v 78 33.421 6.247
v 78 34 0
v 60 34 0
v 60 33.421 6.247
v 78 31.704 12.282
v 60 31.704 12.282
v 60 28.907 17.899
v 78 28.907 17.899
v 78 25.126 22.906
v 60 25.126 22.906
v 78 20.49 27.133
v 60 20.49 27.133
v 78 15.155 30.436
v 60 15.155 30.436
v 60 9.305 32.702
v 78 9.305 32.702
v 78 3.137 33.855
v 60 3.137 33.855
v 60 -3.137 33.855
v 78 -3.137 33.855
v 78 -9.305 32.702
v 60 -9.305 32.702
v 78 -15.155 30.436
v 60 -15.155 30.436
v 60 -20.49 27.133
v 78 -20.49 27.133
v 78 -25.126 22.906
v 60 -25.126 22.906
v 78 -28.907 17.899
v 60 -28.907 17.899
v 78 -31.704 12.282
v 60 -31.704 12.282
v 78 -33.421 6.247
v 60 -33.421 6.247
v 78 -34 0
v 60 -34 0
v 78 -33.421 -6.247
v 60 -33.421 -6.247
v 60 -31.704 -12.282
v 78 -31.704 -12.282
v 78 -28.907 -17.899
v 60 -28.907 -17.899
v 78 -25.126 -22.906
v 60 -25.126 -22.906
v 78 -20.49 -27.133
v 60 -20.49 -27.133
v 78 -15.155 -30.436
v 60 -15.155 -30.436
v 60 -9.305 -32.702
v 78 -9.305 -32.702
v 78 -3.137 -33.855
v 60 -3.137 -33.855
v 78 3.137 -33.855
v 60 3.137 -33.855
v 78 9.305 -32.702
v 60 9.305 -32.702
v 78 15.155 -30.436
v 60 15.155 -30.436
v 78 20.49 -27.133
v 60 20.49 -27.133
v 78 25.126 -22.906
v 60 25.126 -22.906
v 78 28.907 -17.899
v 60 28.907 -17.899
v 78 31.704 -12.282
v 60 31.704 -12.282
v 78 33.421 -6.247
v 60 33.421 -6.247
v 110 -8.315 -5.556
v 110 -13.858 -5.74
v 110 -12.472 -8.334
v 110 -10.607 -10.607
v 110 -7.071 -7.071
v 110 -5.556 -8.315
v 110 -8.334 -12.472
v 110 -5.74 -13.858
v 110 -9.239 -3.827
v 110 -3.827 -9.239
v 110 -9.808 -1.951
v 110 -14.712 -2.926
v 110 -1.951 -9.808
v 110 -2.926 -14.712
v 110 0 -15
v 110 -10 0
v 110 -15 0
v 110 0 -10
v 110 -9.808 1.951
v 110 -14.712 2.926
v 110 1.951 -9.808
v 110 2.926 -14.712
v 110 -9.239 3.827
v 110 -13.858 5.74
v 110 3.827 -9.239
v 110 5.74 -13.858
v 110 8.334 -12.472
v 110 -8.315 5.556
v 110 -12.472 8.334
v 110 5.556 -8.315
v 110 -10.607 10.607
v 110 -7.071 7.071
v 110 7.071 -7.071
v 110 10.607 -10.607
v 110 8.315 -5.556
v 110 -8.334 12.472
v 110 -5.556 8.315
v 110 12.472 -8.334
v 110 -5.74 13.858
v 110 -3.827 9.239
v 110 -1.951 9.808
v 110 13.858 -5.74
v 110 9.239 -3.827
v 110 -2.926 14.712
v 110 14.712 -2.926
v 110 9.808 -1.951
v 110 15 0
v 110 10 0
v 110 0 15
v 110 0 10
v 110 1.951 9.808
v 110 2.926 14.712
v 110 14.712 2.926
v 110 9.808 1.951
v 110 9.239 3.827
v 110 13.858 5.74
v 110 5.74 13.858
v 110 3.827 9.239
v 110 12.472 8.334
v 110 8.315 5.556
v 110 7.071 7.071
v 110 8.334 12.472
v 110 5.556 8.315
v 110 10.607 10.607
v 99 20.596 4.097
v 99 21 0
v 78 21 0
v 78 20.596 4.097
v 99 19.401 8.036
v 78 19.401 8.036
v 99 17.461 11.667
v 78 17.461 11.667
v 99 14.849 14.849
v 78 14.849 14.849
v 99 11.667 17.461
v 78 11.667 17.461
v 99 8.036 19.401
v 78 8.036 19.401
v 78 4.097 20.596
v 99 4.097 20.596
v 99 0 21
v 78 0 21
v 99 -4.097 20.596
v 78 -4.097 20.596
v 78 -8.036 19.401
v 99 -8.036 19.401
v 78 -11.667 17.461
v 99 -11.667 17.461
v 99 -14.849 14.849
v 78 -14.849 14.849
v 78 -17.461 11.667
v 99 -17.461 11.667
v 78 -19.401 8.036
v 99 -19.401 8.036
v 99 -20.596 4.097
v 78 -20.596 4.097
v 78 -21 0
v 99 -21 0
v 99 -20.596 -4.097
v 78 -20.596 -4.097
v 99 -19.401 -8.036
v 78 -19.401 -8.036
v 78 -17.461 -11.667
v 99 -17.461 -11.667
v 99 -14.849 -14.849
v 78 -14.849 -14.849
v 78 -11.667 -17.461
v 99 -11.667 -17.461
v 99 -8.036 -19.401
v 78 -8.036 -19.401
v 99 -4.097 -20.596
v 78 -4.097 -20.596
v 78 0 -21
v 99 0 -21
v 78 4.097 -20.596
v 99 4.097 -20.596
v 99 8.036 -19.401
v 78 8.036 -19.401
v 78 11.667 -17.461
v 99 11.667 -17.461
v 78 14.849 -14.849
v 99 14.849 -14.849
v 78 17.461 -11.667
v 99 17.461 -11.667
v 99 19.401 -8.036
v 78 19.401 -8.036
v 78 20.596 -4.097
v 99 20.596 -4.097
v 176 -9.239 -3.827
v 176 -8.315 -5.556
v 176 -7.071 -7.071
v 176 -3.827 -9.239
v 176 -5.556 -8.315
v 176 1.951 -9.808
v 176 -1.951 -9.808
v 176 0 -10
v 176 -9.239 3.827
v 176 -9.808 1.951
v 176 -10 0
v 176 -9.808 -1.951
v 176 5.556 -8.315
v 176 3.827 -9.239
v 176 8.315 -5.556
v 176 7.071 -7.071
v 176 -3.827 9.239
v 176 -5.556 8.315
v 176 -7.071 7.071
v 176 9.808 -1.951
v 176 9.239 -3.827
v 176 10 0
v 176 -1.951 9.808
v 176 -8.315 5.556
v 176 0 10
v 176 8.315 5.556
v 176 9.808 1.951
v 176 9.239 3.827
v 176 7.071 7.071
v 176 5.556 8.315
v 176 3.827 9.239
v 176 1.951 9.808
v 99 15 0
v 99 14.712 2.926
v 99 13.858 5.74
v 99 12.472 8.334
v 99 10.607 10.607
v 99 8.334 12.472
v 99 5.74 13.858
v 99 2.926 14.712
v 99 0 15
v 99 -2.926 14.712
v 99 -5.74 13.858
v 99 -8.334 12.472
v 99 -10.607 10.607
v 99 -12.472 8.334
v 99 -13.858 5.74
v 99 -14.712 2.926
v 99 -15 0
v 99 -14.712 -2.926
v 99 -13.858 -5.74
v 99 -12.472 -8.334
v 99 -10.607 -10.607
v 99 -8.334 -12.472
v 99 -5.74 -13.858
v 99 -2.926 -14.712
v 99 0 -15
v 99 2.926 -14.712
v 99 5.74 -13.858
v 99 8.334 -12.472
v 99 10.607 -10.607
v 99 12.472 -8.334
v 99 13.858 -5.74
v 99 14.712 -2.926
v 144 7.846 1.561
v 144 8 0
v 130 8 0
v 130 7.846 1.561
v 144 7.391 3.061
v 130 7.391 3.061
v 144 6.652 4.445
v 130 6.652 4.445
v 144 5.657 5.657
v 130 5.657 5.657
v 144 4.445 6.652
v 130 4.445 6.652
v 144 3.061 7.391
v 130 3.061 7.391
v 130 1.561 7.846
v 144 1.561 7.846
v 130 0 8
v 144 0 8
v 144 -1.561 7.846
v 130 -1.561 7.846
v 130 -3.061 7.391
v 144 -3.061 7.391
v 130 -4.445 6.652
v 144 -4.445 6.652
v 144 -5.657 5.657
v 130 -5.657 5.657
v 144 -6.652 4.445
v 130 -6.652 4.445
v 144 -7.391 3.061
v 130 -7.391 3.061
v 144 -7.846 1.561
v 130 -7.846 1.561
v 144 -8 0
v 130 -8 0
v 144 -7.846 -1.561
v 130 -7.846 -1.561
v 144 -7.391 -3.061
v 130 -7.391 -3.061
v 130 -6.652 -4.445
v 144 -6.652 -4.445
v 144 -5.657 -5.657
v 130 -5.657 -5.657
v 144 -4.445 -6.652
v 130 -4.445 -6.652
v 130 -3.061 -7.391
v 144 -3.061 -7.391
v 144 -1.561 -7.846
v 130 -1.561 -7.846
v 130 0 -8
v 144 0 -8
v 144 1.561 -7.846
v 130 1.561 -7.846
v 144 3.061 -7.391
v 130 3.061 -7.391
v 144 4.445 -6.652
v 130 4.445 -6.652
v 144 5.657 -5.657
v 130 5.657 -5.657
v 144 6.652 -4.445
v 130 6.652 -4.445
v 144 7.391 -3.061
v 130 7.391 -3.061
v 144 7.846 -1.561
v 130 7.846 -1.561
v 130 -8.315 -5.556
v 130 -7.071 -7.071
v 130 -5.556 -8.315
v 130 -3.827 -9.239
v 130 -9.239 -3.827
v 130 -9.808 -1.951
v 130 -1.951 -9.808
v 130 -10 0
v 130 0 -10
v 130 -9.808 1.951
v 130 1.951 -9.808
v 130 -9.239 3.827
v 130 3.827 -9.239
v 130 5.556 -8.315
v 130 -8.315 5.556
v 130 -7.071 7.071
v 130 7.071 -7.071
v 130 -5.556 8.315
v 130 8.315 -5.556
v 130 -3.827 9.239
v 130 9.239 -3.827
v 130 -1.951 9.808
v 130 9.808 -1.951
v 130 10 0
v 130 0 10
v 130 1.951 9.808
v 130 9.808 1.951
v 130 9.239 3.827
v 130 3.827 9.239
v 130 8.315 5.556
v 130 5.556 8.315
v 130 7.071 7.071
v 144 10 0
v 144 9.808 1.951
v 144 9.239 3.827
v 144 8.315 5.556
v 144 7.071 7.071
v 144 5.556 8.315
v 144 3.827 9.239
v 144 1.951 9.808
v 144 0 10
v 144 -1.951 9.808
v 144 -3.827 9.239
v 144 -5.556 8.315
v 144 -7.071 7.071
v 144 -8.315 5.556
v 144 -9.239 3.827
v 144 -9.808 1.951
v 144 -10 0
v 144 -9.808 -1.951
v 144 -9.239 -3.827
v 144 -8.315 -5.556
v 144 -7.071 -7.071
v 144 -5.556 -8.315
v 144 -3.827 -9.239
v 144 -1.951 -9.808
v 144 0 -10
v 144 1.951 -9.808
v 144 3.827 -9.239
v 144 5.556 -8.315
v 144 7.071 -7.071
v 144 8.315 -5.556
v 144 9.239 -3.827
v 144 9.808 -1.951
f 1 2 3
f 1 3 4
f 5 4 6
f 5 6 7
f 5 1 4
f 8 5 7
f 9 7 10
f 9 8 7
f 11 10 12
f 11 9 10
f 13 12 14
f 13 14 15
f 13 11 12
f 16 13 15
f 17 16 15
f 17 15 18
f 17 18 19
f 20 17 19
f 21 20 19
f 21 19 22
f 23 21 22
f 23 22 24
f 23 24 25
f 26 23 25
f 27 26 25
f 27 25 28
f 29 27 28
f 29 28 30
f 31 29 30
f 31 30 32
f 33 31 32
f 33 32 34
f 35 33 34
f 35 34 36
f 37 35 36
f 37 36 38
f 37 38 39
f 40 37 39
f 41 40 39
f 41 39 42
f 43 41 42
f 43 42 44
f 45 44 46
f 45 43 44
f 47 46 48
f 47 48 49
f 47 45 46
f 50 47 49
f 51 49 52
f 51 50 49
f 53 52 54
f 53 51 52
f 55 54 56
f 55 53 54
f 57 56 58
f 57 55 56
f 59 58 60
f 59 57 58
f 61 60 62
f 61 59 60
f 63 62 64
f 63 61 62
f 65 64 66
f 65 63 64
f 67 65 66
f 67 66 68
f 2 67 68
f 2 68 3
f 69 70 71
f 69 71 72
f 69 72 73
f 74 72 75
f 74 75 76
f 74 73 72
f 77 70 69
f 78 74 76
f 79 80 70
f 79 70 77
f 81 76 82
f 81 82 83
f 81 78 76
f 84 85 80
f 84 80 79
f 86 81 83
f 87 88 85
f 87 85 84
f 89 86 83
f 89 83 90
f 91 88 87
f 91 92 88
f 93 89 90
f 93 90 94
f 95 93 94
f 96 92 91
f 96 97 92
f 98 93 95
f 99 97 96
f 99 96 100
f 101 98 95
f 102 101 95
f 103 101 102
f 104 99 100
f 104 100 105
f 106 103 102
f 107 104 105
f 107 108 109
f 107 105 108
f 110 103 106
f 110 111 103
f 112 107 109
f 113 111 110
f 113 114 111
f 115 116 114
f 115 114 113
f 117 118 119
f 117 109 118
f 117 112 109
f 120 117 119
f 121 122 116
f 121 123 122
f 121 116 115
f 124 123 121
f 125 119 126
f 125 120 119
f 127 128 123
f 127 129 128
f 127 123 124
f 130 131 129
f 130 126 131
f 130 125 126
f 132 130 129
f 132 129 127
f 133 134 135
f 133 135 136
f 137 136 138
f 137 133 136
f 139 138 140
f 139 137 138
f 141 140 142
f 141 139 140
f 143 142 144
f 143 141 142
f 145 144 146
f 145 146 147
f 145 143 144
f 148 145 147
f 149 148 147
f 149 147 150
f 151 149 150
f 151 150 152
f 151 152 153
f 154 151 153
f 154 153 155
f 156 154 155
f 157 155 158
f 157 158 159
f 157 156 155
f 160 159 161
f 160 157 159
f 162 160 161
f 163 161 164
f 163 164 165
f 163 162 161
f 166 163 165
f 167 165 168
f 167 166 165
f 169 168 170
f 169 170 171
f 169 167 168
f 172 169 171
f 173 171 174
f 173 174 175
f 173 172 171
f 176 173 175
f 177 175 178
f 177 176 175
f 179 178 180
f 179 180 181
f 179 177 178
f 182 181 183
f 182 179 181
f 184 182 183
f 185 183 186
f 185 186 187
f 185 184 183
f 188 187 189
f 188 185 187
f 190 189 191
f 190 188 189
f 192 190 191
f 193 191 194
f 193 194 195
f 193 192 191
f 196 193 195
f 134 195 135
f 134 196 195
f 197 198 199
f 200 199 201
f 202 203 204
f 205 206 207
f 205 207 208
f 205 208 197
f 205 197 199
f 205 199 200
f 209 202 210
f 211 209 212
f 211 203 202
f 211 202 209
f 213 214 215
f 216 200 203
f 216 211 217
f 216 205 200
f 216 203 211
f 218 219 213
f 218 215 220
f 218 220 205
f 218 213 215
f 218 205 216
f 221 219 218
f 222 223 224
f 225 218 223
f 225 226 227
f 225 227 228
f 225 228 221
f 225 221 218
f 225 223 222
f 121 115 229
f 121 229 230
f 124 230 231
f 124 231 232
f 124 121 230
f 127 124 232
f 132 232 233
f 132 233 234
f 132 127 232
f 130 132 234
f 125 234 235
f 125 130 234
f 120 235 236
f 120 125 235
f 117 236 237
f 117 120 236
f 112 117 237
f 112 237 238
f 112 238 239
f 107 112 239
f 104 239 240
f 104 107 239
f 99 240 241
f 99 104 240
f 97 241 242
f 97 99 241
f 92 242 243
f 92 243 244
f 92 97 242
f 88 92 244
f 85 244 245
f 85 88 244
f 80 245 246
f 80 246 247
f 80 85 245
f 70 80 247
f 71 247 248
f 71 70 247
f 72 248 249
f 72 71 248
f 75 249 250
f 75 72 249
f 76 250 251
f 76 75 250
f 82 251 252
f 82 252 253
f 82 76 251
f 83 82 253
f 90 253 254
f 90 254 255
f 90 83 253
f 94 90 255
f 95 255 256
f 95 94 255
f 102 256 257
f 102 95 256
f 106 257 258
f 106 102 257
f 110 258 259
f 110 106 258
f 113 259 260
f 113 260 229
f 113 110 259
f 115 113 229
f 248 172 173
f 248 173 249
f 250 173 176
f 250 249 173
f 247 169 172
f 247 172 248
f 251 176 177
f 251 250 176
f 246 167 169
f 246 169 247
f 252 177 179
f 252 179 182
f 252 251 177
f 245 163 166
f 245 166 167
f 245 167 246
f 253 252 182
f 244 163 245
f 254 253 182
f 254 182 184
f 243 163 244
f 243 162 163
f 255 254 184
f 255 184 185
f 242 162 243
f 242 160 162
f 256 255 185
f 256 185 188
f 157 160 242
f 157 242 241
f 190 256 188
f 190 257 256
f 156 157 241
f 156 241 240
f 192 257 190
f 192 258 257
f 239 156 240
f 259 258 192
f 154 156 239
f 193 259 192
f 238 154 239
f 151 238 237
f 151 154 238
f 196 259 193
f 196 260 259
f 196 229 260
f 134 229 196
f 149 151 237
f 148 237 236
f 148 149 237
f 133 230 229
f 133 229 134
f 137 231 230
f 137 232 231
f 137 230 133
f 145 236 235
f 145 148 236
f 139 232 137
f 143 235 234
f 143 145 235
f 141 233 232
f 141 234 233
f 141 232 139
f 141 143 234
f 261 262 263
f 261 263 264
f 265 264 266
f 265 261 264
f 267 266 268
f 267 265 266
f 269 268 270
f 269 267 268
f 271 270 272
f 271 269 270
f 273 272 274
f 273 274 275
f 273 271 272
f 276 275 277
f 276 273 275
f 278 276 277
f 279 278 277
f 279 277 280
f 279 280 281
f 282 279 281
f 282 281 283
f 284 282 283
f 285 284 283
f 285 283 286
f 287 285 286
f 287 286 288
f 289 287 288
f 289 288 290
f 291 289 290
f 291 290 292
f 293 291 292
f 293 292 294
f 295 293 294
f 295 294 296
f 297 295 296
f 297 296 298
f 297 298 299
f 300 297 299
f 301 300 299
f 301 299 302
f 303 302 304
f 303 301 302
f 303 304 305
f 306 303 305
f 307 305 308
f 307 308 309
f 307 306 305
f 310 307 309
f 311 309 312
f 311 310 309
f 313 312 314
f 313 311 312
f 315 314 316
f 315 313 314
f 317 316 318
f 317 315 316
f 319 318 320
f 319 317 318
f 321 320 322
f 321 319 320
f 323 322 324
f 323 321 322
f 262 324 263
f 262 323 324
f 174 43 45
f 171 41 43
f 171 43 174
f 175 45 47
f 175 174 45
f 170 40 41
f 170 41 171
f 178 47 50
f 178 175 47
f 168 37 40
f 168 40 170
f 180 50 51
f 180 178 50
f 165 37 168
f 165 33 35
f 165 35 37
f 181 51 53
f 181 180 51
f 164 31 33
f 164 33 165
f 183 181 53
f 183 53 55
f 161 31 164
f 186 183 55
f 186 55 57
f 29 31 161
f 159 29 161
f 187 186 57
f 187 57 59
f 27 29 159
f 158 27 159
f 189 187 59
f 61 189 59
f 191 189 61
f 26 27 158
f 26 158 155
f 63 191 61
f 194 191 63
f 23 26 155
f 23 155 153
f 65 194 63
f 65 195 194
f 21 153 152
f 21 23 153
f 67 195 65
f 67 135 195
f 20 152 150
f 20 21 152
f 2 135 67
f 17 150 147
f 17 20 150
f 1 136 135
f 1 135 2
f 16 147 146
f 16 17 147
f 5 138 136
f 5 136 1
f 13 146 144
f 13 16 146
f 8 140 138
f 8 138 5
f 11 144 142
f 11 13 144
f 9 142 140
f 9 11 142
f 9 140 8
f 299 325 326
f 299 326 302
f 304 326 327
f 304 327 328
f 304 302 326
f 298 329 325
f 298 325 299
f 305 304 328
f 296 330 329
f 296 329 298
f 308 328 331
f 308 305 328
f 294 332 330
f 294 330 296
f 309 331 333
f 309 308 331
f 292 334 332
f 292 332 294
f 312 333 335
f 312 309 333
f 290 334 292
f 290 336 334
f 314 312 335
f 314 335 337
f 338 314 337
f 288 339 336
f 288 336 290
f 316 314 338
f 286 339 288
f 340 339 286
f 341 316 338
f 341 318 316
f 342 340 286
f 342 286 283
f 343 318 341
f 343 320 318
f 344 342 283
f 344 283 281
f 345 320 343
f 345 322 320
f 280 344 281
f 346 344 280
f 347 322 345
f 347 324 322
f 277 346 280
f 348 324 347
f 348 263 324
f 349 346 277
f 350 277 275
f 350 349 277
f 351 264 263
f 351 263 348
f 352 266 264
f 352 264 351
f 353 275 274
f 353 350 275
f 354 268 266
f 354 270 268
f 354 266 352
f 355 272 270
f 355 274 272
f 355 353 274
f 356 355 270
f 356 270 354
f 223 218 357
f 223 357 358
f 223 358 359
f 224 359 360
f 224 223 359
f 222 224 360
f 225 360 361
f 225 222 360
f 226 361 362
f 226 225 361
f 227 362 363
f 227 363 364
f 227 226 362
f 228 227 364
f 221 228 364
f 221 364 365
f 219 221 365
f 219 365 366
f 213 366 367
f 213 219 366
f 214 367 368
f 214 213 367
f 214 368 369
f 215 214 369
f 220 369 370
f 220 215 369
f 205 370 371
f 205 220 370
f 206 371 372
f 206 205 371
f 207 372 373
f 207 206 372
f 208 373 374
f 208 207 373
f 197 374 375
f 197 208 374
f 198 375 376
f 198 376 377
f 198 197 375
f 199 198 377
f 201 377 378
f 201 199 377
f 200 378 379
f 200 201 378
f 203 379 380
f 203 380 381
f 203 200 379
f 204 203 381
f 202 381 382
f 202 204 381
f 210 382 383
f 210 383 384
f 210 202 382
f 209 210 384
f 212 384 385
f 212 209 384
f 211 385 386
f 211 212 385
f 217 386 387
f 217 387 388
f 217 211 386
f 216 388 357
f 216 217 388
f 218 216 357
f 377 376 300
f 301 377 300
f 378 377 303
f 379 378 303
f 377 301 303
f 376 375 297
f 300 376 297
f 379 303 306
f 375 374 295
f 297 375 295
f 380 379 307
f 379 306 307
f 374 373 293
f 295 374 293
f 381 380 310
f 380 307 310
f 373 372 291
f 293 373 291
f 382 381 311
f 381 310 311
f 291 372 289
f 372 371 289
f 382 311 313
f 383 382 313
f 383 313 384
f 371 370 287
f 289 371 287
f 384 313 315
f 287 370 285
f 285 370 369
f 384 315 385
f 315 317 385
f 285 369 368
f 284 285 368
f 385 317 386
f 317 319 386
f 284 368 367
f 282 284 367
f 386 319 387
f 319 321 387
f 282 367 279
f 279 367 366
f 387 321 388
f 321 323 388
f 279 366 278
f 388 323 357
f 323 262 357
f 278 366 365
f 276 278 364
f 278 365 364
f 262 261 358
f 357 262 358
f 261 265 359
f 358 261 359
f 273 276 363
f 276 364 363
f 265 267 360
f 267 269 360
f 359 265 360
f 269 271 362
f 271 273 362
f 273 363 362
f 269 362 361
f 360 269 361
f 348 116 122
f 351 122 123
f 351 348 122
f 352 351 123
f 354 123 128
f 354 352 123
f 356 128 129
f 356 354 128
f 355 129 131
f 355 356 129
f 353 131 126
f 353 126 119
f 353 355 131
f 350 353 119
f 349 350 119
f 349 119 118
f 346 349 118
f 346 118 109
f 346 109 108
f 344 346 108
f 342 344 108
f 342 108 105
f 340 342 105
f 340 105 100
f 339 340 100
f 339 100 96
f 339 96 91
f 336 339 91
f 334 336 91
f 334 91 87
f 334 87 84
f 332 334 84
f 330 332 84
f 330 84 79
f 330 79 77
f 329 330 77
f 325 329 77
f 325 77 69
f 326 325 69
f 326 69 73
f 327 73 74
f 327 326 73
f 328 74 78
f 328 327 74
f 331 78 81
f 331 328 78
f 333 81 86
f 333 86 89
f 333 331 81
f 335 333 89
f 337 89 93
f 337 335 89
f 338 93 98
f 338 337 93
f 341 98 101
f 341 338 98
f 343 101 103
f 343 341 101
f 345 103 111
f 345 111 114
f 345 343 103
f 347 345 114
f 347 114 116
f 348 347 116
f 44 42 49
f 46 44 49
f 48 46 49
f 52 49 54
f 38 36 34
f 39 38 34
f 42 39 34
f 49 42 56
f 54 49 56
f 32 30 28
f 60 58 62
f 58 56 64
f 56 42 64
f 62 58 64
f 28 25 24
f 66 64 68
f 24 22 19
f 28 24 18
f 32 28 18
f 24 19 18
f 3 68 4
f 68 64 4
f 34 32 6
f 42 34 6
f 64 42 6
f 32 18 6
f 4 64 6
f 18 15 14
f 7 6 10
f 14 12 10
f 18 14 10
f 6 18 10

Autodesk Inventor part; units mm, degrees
ref_plane "YZ Plane" through (0, 0, 0) normal (1, 0, 0) x (0, 1, 0)
ref_plane "XZ Plane" through (0, 0, 0) normal (0, 1, 0) x (-1, 0, 0)
ref_plane "XY Plane" through (0, 0, 0) normal (0, 0, 1) x (1, 0, 0)
sketch "Sketch1" plane through (0, 0, 0) normal (0, 0, 1) x (1, 0, 0)
  line L0 (60, 13.5) -> (60, 0) construction
  line L1 (60, 0) -> (60, 34)
  line L2 (60, 34) -> (78, 34)
  line L3 (78, 34) -> (78, 0)
  line L4 (78, 0) -> (78, 21)
  line L5 (78, 21) -> (99, 21)
  line L6 (99, 21) -> (99, 0)
  line L7 (99, 0) -> (99, 15)
  line L8 (99, 15) -> (110, 15)
  line L9 (110, 15) -> (110, 0)
  line L10 (110, 0) -> (110, 10)
  line L11 (110, 10) -> (130, 10)
  line L12 (130, 10) -> (130, 0)
  line L13 (130, 0) -> (130, 8)
  line L14 (130, 8) -> (144, 8)
  line L15 (144, 8) -> (144, 0)
  line L16 (144, 0) -> (144, 10)
  line L17 (144, 10) -> (176, 10)
  line L18 (176, 10) -> (176, 0)
  line L19 (0, 0) -> (225.6875, 0)
  dimension "d8" = 34
  dimension "d9" = 18
  dimension "d10" = 21
  dimension "d11" = 21
  dimension "d12" = 15
  dimension "d13" = 11
  dimension "d14" = 10
  dimension "d15" = 20
  dimension "d16" = 8
  dimension "d17" = 14
  dimension "d18" = 10
  dimension "d19" = 32
  dimension "d46" = 98
revolve "Revolution1" add sketch "Sketch1" angle 360 about axis through (0, 0, 0) along (1, 0, 0)
sketch "Sketch4" plane through (60, 0, 0) normal (-1, 0, 0) x (0, 0, 1)
  point P0 (0, 0)
properties part number "Sketch 2d terminado sin rotacion aun"
